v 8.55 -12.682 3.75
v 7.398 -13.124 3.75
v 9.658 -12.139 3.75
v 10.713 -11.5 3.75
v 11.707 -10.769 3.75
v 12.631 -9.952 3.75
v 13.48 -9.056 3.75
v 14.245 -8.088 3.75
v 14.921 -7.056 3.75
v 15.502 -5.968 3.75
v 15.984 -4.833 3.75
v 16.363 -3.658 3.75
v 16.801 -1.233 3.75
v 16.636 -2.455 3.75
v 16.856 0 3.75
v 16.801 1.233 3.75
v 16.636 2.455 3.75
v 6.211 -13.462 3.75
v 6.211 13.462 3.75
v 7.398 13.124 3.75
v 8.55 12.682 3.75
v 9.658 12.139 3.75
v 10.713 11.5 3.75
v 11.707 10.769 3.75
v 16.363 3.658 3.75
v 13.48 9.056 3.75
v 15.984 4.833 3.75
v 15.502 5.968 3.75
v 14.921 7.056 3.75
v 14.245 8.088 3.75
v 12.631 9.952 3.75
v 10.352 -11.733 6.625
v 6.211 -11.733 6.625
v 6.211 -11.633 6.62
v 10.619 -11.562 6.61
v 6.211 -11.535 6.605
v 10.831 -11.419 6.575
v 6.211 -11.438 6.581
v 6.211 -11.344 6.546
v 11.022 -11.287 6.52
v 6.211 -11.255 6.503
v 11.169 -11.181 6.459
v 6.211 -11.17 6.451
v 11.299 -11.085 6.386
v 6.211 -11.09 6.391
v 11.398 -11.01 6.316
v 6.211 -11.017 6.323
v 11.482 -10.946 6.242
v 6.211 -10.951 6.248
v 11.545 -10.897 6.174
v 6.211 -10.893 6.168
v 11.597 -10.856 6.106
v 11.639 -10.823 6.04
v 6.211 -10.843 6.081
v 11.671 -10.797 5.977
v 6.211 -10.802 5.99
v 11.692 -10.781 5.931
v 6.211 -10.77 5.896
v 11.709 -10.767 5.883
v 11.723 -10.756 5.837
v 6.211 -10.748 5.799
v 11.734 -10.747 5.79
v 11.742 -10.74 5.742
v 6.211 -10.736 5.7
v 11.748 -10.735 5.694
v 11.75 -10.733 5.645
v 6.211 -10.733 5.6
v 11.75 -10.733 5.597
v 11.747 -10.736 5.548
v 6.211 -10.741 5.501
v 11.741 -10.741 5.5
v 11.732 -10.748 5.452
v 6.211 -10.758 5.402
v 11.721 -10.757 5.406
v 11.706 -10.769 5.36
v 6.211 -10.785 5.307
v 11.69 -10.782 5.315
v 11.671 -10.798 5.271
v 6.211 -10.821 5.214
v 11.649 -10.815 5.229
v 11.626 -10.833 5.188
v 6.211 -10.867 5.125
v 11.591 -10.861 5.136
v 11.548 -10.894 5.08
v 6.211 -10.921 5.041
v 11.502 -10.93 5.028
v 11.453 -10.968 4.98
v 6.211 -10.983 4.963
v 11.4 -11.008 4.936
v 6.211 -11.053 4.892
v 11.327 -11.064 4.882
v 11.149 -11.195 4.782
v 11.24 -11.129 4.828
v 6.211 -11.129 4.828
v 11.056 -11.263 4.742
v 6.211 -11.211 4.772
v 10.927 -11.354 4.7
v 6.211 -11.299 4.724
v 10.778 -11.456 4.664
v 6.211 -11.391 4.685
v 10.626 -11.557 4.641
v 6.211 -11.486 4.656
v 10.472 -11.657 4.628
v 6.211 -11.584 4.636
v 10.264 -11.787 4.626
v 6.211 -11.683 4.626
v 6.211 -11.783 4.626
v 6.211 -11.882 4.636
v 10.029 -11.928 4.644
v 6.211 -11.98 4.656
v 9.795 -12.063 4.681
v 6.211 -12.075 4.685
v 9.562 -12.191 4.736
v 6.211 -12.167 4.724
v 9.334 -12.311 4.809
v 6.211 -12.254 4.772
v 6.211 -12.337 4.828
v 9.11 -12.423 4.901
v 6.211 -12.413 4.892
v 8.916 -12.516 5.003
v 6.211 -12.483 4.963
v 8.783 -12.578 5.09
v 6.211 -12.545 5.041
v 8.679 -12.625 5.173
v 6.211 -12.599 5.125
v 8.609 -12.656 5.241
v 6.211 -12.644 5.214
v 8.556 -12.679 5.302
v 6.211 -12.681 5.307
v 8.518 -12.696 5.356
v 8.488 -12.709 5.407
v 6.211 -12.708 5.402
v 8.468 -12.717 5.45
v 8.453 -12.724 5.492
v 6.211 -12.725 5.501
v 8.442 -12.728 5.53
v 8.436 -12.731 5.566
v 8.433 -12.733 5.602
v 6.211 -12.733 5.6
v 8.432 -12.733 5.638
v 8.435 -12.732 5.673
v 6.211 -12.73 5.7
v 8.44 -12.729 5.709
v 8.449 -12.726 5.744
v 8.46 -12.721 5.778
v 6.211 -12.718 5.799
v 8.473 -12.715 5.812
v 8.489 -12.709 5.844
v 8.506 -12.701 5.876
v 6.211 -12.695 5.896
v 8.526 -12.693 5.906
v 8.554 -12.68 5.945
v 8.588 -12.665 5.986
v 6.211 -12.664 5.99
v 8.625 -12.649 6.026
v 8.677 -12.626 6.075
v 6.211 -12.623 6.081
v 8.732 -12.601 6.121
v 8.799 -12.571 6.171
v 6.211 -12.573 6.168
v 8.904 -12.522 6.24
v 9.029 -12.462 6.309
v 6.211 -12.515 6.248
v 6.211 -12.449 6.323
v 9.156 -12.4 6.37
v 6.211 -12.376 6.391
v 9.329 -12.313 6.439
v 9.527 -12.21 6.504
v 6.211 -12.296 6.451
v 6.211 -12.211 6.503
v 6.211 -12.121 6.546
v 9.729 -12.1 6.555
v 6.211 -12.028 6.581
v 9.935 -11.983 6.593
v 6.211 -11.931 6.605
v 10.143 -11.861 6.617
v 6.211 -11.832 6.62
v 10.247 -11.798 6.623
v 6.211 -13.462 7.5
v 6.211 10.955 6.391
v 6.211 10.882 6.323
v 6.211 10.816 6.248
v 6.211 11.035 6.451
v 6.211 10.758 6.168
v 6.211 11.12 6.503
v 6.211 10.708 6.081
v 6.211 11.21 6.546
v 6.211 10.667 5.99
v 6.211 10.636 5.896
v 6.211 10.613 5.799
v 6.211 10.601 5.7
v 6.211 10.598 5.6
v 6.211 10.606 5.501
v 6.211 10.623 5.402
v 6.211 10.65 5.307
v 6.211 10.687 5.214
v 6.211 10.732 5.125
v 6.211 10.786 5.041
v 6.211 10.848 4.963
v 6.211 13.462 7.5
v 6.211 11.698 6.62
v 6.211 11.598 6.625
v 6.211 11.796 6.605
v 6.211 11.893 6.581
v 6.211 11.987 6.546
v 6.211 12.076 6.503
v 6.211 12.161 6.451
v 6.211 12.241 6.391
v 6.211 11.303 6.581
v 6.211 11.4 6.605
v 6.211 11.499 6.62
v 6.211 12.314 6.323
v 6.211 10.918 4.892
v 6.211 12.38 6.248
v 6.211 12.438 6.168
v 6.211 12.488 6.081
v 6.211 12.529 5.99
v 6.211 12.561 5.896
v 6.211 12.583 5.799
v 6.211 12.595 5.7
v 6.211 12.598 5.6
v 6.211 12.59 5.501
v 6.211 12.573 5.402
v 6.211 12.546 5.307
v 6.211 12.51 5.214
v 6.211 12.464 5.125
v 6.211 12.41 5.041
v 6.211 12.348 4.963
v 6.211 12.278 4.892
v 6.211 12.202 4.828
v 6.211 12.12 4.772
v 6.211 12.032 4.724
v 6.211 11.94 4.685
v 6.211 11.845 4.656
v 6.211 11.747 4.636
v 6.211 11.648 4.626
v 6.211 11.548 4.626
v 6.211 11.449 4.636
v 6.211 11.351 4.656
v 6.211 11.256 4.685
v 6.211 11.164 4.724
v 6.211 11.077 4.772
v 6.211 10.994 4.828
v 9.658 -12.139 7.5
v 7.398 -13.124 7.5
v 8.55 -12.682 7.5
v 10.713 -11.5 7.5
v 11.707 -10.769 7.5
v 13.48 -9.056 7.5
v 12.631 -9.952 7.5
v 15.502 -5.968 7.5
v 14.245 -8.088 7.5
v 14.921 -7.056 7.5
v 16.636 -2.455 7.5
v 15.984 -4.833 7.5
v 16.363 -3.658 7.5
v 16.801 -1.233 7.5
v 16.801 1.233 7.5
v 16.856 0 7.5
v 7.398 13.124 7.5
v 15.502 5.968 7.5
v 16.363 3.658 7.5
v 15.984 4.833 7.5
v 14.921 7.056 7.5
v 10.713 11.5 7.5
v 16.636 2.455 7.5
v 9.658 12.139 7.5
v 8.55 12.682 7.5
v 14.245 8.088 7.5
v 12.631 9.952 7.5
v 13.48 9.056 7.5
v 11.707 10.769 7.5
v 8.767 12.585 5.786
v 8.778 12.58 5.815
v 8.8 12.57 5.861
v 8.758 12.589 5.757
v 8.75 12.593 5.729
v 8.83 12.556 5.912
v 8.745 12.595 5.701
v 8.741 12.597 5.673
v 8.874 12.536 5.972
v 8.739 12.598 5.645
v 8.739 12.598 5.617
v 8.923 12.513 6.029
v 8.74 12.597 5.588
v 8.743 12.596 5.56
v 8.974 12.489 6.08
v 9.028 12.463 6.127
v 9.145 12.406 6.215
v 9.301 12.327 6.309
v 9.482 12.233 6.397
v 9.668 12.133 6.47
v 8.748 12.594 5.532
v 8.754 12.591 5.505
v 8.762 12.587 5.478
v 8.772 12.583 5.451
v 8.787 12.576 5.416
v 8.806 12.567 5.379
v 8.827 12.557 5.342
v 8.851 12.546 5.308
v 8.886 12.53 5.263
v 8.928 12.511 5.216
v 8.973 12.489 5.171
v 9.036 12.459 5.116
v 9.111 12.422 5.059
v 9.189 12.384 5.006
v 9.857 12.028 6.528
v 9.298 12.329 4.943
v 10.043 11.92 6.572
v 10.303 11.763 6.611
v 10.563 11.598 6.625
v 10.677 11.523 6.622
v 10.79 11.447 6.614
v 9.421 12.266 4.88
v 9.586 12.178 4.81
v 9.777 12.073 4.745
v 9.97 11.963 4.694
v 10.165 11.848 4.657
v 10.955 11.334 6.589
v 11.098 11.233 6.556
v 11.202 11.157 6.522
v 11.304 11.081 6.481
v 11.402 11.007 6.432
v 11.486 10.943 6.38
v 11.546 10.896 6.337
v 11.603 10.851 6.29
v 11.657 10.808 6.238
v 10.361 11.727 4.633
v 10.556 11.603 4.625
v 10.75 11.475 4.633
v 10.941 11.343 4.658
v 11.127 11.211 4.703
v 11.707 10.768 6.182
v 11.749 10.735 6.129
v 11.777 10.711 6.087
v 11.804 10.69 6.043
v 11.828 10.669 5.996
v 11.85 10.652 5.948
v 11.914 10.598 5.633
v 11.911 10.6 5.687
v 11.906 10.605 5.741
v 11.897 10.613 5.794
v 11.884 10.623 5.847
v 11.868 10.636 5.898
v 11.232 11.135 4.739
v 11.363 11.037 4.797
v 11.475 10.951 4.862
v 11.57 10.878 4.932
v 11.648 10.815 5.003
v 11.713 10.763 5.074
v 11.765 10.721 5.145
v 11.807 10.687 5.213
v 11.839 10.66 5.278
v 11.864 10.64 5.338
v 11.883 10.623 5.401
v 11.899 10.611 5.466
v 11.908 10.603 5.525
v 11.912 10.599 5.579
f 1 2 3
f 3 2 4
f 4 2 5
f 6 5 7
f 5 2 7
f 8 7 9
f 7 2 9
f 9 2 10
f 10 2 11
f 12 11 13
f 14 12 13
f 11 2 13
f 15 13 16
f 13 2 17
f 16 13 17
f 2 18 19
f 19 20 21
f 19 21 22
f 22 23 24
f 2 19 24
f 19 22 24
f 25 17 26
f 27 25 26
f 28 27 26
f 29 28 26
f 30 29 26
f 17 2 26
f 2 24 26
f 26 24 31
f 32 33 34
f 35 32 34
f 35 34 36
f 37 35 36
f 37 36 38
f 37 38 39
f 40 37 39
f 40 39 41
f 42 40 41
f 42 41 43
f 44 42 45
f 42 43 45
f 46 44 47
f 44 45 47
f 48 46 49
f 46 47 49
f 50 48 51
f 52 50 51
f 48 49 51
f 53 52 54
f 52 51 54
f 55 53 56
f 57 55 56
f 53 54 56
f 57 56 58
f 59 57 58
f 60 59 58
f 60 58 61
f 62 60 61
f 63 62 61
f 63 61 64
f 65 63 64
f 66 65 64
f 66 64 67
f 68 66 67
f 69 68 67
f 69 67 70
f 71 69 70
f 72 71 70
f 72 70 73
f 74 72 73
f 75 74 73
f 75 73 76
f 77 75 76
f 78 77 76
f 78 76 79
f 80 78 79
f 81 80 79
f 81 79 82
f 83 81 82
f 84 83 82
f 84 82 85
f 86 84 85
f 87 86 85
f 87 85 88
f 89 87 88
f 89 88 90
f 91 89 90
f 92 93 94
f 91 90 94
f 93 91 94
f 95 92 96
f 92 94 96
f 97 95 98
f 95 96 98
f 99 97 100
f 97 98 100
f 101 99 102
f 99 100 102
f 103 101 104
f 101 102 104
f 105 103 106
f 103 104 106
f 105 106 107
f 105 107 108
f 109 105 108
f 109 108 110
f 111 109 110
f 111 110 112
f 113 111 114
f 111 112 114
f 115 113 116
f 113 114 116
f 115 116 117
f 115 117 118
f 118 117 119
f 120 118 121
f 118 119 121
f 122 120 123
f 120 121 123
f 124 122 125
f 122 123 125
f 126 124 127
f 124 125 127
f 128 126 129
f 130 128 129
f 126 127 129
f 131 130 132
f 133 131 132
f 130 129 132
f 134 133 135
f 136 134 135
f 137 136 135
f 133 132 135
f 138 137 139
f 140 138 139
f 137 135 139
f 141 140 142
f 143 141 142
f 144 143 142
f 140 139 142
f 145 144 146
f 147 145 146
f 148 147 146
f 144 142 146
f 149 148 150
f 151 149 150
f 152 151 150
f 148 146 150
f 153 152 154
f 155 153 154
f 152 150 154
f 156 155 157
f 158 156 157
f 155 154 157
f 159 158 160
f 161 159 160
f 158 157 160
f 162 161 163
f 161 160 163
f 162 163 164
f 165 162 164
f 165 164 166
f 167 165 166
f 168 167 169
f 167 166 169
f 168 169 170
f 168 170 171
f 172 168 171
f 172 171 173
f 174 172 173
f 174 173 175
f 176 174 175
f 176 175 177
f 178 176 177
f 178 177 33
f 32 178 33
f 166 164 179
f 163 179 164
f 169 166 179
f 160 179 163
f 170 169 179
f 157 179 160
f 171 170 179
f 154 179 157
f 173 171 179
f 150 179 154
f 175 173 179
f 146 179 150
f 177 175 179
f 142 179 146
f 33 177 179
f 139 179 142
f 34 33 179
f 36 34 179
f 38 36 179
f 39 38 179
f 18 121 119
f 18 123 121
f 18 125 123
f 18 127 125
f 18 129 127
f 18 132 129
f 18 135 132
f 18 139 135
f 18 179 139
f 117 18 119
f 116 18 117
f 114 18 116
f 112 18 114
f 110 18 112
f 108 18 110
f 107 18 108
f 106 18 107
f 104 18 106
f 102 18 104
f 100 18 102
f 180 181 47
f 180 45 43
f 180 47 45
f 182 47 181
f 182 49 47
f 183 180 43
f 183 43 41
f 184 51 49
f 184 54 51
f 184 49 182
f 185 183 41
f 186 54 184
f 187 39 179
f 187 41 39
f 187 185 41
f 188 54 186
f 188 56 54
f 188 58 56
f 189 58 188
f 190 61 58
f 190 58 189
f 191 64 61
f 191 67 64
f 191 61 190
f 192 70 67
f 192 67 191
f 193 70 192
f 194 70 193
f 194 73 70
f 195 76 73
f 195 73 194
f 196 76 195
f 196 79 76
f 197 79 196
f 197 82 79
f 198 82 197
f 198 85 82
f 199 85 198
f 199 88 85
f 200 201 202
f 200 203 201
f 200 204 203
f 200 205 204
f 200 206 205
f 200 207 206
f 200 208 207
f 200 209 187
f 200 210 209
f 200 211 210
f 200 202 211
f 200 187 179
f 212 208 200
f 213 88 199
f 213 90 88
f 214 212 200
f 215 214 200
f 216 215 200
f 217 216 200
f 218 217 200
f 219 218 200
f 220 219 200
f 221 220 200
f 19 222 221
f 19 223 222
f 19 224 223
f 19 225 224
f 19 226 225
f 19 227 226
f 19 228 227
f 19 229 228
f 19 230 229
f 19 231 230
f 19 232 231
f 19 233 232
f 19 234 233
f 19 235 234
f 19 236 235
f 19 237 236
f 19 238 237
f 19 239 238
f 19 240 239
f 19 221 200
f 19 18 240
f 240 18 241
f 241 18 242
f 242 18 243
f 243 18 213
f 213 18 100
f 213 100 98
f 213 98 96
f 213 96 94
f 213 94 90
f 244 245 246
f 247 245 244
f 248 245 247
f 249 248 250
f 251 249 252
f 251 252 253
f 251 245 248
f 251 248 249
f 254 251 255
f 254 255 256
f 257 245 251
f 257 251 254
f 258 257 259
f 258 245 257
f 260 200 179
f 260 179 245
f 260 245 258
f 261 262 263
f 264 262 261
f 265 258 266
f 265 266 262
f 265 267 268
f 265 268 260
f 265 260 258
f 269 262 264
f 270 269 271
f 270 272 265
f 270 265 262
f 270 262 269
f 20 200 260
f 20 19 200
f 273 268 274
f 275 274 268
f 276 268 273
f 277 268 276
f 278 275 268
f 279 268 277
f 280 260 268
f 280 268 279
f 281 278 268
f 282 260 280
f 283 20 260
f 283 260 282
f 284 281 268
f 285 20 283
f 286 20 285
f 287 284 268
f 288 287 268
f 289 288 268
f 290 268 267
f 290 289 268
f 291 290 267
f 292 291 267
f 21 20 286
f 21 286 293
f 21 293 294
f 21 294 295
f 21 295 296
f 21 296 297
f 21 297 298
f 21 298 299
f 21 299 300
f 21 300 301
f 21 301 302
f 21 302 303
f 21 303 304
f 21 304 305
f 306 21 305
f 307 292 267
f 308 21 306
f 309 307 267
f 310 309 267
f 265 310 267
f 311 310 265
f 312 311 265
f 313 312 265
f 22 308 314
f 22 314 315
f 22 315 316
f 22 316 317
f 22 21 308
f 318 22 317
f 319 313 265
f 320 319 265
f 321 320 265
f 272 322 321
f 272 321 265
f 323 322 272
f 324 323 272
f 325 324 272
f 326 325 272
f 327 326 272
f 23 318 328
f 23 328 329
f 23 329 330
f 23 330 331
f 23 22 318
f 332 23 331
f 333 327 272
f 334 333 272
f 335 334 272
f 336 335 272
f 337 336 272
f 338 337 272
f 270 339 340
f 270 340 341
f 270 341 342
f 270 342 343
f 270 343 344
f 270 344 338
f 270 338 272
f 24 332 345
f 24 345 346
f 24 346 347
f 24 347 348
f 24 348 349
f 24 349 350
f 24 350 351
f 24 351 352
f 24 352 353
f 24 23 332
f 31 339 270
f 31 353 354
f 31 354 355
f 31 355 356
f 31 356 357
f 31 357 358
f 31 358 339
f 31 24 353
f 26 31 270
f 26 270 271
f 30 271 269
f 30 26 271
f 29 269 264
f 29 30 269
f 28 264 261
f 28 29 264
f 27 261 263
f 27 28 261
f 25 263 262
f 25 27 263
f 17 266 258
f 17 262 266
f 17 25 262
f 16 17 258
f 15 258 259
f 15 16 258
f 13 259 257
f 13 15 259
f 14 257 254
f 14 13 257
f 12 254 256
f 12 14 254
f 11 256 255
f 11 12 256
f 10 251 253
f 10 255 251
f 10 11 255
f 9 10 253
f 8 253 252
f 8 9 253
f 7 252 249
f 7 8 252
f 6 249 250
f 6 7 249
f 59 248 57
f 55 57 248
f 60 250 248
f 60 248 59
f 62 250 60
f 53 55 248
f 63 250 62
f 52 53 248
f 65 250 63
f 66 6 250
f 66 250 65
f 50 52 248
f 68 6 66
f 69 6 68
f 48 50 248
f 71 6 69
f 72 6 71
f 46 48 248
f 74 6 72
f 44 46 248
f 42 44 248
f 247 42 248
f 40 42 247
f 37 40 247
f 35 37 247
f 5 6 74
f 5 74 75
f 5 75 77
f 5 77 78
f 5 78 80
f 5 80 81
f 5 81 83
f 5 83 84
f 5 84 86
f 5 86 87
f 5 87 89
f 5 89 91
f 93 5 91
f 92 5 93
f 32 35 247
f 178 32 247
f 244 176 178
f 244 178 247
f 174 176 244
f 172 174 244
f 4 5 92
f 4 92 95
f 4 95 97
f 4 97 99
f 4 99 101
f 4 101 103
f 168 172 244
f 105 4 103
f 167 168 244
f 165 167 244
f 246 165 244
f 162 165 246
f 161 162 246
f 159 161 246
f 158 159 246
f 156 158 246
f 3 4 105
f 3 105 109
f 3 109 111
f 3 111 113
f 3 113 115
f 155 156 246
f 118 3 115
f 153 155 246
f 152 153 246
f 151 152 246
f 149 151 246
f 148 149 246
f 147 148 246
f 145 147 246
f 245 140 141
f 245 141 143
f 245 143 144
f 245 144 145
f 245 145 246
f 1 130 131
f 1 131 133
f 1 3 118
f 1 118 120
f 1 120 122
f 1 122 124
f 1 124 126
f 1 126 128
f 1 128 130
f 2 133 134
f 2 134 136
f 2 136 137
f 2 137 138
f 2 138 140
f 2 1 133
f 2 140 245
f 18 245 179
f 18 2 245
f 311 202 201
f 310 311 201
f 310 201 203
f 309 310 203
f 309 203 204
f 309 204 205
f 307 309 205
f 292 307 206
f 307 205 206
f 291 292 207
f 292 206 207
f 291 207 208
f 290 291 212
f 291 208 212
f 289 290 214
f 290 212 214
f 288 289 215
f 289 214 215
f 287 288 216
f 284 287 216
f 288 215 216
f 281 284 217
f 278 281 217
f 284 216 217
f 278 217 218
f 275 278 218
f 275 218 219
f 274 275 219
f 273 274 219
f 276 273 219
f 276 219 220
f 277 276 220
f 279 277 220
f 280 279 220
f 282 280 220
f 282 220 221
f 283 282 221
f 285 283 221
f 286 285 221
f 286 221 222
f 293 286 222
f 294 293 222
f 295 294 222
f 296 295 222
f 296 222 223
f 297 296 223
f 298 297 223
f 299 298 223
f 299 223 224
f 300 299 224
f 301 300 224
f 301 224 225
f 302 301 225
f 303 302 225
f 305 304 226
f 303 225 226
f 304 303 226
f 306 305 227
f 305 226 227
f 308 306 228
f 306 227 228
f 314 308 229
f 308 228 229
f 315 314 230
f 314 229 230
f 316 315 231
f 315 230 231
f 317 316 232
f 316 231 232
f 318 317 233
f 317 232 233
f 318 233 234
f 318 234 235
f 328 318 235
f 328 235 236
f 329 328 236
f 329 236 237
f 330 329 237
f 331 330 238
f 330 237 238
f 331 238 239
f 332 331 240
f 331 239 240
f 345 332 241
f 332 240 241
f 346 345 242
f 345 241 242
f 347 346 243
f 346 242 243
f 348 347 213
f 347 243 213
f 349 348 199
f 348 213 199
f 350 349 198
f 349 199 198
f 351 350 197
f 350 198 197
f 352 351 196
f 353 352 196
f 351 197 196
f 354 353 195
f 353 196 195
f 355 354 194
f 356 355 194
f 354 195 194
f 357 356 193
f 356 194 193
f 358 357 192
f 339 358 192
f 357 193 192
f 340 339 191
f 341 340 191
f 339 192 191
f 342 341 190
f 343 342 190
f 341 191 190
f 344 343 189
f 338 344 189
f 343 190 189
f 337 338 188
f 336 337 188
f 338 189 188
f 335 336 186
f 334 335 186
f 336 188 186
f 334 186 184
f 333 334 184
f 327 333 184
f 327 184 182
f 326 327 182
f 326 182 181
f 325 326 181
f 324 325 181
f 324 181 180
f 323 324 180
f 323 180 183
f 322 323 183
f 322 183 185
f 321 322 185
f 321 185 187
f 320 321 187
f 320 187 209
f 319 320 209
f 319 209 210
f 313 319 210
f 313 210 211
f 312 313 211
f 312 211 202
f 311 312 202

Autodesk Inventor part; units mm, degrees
ref_plane "YZ Plane" through (0, 0, 0) normal (1, 0, 0) x (0, 1, 0)
ref_plane "XZ Plane" through (0, 0, 0) normal (0, 1, 0) x (-1, 0, 0)
ref_plane "XY Plane" through (0, 0, 0) normal (0, 0, 1) x (1, 0, 0)
sketch "Sketch1" plane through (0, 0, 0) normal (0, 0, 1) x (1, 0, 0)
  line L0 (6.2115, -26.7893) -> (6.2115, 26.924)
  line L1 (6.2115, 26.7893) -> (6.2115, -26.7893)
  arc A0 (6.2115, -26.924) -> (6.2115, 26.924) centre (-0.1699, 0) ccw
  line L2 (6.2115, 26.924) -> (6.2115, -26.924)
  point P0 (0, 0)
  point P1 (-5.2115, 24.6247)
extrude "Extrusion1" add sketch "Sketch1" along normal blind 7.5
sketch "Sketch2" plane through (6.2115, -26.924, 0) normal (-1, 0, 0) x (0, 0, 1)
  line L0 (0, 6.9167) -> (7.5, 6.9167)
  line L1 (0, 0) -> (0, 6.9167)
  line L2 (0, 6.9167) -> (7.5, 6.9167)
  line L3 (7.5, 26.7893) -> (7.5, 0)
  line L4 (7.5, 6.9167) -> (7.5, 0)
  line L5 (7.5, 0) -> (0, 0)
  line L6 (7.5, 0) -> (0, 0)
  circle A0 centre (3.75, 3.4583) radius 1
  line L7 (0, 0) -> (0, 53.5786)
  line L8 (0, 53.5786) -> (0, 0)
  line L9 (0, 26.7893) -> (7.5, 26.7893)
  circle A1 centre (3.75, 50.1203) radius 1
  circle A2 centre (3.75, 3.4583) radius 2
  circle A3 centre (3.75, 50.1203) radius 2
  point P0 (0, 26.924)
  point P1 (280.32, 51.414)
  point P2 (4.4851, 4.1363)
  point P3 (4.4851, 2.7804)
  point P4 (3.0149, 4.1363)
  point P5 (3.0149, 2.7804)
  dimension "d2" = 2
  dimension "d5" = 4
  dimension "d6" = 4
extrude "Extrusion2" cut sketch "Sketch2" against normal blind 25.4 contours A0 | A1
extrude "Extrusion3" cut sketch "Sketch2" against normal blind 16.35 contours A2 | A3
scale "Scale1" factors (0.5, 0.5, 0.5) then translate (3.1057, 0, 3.75) bodies 1
properties part number "Contrapeso4"
